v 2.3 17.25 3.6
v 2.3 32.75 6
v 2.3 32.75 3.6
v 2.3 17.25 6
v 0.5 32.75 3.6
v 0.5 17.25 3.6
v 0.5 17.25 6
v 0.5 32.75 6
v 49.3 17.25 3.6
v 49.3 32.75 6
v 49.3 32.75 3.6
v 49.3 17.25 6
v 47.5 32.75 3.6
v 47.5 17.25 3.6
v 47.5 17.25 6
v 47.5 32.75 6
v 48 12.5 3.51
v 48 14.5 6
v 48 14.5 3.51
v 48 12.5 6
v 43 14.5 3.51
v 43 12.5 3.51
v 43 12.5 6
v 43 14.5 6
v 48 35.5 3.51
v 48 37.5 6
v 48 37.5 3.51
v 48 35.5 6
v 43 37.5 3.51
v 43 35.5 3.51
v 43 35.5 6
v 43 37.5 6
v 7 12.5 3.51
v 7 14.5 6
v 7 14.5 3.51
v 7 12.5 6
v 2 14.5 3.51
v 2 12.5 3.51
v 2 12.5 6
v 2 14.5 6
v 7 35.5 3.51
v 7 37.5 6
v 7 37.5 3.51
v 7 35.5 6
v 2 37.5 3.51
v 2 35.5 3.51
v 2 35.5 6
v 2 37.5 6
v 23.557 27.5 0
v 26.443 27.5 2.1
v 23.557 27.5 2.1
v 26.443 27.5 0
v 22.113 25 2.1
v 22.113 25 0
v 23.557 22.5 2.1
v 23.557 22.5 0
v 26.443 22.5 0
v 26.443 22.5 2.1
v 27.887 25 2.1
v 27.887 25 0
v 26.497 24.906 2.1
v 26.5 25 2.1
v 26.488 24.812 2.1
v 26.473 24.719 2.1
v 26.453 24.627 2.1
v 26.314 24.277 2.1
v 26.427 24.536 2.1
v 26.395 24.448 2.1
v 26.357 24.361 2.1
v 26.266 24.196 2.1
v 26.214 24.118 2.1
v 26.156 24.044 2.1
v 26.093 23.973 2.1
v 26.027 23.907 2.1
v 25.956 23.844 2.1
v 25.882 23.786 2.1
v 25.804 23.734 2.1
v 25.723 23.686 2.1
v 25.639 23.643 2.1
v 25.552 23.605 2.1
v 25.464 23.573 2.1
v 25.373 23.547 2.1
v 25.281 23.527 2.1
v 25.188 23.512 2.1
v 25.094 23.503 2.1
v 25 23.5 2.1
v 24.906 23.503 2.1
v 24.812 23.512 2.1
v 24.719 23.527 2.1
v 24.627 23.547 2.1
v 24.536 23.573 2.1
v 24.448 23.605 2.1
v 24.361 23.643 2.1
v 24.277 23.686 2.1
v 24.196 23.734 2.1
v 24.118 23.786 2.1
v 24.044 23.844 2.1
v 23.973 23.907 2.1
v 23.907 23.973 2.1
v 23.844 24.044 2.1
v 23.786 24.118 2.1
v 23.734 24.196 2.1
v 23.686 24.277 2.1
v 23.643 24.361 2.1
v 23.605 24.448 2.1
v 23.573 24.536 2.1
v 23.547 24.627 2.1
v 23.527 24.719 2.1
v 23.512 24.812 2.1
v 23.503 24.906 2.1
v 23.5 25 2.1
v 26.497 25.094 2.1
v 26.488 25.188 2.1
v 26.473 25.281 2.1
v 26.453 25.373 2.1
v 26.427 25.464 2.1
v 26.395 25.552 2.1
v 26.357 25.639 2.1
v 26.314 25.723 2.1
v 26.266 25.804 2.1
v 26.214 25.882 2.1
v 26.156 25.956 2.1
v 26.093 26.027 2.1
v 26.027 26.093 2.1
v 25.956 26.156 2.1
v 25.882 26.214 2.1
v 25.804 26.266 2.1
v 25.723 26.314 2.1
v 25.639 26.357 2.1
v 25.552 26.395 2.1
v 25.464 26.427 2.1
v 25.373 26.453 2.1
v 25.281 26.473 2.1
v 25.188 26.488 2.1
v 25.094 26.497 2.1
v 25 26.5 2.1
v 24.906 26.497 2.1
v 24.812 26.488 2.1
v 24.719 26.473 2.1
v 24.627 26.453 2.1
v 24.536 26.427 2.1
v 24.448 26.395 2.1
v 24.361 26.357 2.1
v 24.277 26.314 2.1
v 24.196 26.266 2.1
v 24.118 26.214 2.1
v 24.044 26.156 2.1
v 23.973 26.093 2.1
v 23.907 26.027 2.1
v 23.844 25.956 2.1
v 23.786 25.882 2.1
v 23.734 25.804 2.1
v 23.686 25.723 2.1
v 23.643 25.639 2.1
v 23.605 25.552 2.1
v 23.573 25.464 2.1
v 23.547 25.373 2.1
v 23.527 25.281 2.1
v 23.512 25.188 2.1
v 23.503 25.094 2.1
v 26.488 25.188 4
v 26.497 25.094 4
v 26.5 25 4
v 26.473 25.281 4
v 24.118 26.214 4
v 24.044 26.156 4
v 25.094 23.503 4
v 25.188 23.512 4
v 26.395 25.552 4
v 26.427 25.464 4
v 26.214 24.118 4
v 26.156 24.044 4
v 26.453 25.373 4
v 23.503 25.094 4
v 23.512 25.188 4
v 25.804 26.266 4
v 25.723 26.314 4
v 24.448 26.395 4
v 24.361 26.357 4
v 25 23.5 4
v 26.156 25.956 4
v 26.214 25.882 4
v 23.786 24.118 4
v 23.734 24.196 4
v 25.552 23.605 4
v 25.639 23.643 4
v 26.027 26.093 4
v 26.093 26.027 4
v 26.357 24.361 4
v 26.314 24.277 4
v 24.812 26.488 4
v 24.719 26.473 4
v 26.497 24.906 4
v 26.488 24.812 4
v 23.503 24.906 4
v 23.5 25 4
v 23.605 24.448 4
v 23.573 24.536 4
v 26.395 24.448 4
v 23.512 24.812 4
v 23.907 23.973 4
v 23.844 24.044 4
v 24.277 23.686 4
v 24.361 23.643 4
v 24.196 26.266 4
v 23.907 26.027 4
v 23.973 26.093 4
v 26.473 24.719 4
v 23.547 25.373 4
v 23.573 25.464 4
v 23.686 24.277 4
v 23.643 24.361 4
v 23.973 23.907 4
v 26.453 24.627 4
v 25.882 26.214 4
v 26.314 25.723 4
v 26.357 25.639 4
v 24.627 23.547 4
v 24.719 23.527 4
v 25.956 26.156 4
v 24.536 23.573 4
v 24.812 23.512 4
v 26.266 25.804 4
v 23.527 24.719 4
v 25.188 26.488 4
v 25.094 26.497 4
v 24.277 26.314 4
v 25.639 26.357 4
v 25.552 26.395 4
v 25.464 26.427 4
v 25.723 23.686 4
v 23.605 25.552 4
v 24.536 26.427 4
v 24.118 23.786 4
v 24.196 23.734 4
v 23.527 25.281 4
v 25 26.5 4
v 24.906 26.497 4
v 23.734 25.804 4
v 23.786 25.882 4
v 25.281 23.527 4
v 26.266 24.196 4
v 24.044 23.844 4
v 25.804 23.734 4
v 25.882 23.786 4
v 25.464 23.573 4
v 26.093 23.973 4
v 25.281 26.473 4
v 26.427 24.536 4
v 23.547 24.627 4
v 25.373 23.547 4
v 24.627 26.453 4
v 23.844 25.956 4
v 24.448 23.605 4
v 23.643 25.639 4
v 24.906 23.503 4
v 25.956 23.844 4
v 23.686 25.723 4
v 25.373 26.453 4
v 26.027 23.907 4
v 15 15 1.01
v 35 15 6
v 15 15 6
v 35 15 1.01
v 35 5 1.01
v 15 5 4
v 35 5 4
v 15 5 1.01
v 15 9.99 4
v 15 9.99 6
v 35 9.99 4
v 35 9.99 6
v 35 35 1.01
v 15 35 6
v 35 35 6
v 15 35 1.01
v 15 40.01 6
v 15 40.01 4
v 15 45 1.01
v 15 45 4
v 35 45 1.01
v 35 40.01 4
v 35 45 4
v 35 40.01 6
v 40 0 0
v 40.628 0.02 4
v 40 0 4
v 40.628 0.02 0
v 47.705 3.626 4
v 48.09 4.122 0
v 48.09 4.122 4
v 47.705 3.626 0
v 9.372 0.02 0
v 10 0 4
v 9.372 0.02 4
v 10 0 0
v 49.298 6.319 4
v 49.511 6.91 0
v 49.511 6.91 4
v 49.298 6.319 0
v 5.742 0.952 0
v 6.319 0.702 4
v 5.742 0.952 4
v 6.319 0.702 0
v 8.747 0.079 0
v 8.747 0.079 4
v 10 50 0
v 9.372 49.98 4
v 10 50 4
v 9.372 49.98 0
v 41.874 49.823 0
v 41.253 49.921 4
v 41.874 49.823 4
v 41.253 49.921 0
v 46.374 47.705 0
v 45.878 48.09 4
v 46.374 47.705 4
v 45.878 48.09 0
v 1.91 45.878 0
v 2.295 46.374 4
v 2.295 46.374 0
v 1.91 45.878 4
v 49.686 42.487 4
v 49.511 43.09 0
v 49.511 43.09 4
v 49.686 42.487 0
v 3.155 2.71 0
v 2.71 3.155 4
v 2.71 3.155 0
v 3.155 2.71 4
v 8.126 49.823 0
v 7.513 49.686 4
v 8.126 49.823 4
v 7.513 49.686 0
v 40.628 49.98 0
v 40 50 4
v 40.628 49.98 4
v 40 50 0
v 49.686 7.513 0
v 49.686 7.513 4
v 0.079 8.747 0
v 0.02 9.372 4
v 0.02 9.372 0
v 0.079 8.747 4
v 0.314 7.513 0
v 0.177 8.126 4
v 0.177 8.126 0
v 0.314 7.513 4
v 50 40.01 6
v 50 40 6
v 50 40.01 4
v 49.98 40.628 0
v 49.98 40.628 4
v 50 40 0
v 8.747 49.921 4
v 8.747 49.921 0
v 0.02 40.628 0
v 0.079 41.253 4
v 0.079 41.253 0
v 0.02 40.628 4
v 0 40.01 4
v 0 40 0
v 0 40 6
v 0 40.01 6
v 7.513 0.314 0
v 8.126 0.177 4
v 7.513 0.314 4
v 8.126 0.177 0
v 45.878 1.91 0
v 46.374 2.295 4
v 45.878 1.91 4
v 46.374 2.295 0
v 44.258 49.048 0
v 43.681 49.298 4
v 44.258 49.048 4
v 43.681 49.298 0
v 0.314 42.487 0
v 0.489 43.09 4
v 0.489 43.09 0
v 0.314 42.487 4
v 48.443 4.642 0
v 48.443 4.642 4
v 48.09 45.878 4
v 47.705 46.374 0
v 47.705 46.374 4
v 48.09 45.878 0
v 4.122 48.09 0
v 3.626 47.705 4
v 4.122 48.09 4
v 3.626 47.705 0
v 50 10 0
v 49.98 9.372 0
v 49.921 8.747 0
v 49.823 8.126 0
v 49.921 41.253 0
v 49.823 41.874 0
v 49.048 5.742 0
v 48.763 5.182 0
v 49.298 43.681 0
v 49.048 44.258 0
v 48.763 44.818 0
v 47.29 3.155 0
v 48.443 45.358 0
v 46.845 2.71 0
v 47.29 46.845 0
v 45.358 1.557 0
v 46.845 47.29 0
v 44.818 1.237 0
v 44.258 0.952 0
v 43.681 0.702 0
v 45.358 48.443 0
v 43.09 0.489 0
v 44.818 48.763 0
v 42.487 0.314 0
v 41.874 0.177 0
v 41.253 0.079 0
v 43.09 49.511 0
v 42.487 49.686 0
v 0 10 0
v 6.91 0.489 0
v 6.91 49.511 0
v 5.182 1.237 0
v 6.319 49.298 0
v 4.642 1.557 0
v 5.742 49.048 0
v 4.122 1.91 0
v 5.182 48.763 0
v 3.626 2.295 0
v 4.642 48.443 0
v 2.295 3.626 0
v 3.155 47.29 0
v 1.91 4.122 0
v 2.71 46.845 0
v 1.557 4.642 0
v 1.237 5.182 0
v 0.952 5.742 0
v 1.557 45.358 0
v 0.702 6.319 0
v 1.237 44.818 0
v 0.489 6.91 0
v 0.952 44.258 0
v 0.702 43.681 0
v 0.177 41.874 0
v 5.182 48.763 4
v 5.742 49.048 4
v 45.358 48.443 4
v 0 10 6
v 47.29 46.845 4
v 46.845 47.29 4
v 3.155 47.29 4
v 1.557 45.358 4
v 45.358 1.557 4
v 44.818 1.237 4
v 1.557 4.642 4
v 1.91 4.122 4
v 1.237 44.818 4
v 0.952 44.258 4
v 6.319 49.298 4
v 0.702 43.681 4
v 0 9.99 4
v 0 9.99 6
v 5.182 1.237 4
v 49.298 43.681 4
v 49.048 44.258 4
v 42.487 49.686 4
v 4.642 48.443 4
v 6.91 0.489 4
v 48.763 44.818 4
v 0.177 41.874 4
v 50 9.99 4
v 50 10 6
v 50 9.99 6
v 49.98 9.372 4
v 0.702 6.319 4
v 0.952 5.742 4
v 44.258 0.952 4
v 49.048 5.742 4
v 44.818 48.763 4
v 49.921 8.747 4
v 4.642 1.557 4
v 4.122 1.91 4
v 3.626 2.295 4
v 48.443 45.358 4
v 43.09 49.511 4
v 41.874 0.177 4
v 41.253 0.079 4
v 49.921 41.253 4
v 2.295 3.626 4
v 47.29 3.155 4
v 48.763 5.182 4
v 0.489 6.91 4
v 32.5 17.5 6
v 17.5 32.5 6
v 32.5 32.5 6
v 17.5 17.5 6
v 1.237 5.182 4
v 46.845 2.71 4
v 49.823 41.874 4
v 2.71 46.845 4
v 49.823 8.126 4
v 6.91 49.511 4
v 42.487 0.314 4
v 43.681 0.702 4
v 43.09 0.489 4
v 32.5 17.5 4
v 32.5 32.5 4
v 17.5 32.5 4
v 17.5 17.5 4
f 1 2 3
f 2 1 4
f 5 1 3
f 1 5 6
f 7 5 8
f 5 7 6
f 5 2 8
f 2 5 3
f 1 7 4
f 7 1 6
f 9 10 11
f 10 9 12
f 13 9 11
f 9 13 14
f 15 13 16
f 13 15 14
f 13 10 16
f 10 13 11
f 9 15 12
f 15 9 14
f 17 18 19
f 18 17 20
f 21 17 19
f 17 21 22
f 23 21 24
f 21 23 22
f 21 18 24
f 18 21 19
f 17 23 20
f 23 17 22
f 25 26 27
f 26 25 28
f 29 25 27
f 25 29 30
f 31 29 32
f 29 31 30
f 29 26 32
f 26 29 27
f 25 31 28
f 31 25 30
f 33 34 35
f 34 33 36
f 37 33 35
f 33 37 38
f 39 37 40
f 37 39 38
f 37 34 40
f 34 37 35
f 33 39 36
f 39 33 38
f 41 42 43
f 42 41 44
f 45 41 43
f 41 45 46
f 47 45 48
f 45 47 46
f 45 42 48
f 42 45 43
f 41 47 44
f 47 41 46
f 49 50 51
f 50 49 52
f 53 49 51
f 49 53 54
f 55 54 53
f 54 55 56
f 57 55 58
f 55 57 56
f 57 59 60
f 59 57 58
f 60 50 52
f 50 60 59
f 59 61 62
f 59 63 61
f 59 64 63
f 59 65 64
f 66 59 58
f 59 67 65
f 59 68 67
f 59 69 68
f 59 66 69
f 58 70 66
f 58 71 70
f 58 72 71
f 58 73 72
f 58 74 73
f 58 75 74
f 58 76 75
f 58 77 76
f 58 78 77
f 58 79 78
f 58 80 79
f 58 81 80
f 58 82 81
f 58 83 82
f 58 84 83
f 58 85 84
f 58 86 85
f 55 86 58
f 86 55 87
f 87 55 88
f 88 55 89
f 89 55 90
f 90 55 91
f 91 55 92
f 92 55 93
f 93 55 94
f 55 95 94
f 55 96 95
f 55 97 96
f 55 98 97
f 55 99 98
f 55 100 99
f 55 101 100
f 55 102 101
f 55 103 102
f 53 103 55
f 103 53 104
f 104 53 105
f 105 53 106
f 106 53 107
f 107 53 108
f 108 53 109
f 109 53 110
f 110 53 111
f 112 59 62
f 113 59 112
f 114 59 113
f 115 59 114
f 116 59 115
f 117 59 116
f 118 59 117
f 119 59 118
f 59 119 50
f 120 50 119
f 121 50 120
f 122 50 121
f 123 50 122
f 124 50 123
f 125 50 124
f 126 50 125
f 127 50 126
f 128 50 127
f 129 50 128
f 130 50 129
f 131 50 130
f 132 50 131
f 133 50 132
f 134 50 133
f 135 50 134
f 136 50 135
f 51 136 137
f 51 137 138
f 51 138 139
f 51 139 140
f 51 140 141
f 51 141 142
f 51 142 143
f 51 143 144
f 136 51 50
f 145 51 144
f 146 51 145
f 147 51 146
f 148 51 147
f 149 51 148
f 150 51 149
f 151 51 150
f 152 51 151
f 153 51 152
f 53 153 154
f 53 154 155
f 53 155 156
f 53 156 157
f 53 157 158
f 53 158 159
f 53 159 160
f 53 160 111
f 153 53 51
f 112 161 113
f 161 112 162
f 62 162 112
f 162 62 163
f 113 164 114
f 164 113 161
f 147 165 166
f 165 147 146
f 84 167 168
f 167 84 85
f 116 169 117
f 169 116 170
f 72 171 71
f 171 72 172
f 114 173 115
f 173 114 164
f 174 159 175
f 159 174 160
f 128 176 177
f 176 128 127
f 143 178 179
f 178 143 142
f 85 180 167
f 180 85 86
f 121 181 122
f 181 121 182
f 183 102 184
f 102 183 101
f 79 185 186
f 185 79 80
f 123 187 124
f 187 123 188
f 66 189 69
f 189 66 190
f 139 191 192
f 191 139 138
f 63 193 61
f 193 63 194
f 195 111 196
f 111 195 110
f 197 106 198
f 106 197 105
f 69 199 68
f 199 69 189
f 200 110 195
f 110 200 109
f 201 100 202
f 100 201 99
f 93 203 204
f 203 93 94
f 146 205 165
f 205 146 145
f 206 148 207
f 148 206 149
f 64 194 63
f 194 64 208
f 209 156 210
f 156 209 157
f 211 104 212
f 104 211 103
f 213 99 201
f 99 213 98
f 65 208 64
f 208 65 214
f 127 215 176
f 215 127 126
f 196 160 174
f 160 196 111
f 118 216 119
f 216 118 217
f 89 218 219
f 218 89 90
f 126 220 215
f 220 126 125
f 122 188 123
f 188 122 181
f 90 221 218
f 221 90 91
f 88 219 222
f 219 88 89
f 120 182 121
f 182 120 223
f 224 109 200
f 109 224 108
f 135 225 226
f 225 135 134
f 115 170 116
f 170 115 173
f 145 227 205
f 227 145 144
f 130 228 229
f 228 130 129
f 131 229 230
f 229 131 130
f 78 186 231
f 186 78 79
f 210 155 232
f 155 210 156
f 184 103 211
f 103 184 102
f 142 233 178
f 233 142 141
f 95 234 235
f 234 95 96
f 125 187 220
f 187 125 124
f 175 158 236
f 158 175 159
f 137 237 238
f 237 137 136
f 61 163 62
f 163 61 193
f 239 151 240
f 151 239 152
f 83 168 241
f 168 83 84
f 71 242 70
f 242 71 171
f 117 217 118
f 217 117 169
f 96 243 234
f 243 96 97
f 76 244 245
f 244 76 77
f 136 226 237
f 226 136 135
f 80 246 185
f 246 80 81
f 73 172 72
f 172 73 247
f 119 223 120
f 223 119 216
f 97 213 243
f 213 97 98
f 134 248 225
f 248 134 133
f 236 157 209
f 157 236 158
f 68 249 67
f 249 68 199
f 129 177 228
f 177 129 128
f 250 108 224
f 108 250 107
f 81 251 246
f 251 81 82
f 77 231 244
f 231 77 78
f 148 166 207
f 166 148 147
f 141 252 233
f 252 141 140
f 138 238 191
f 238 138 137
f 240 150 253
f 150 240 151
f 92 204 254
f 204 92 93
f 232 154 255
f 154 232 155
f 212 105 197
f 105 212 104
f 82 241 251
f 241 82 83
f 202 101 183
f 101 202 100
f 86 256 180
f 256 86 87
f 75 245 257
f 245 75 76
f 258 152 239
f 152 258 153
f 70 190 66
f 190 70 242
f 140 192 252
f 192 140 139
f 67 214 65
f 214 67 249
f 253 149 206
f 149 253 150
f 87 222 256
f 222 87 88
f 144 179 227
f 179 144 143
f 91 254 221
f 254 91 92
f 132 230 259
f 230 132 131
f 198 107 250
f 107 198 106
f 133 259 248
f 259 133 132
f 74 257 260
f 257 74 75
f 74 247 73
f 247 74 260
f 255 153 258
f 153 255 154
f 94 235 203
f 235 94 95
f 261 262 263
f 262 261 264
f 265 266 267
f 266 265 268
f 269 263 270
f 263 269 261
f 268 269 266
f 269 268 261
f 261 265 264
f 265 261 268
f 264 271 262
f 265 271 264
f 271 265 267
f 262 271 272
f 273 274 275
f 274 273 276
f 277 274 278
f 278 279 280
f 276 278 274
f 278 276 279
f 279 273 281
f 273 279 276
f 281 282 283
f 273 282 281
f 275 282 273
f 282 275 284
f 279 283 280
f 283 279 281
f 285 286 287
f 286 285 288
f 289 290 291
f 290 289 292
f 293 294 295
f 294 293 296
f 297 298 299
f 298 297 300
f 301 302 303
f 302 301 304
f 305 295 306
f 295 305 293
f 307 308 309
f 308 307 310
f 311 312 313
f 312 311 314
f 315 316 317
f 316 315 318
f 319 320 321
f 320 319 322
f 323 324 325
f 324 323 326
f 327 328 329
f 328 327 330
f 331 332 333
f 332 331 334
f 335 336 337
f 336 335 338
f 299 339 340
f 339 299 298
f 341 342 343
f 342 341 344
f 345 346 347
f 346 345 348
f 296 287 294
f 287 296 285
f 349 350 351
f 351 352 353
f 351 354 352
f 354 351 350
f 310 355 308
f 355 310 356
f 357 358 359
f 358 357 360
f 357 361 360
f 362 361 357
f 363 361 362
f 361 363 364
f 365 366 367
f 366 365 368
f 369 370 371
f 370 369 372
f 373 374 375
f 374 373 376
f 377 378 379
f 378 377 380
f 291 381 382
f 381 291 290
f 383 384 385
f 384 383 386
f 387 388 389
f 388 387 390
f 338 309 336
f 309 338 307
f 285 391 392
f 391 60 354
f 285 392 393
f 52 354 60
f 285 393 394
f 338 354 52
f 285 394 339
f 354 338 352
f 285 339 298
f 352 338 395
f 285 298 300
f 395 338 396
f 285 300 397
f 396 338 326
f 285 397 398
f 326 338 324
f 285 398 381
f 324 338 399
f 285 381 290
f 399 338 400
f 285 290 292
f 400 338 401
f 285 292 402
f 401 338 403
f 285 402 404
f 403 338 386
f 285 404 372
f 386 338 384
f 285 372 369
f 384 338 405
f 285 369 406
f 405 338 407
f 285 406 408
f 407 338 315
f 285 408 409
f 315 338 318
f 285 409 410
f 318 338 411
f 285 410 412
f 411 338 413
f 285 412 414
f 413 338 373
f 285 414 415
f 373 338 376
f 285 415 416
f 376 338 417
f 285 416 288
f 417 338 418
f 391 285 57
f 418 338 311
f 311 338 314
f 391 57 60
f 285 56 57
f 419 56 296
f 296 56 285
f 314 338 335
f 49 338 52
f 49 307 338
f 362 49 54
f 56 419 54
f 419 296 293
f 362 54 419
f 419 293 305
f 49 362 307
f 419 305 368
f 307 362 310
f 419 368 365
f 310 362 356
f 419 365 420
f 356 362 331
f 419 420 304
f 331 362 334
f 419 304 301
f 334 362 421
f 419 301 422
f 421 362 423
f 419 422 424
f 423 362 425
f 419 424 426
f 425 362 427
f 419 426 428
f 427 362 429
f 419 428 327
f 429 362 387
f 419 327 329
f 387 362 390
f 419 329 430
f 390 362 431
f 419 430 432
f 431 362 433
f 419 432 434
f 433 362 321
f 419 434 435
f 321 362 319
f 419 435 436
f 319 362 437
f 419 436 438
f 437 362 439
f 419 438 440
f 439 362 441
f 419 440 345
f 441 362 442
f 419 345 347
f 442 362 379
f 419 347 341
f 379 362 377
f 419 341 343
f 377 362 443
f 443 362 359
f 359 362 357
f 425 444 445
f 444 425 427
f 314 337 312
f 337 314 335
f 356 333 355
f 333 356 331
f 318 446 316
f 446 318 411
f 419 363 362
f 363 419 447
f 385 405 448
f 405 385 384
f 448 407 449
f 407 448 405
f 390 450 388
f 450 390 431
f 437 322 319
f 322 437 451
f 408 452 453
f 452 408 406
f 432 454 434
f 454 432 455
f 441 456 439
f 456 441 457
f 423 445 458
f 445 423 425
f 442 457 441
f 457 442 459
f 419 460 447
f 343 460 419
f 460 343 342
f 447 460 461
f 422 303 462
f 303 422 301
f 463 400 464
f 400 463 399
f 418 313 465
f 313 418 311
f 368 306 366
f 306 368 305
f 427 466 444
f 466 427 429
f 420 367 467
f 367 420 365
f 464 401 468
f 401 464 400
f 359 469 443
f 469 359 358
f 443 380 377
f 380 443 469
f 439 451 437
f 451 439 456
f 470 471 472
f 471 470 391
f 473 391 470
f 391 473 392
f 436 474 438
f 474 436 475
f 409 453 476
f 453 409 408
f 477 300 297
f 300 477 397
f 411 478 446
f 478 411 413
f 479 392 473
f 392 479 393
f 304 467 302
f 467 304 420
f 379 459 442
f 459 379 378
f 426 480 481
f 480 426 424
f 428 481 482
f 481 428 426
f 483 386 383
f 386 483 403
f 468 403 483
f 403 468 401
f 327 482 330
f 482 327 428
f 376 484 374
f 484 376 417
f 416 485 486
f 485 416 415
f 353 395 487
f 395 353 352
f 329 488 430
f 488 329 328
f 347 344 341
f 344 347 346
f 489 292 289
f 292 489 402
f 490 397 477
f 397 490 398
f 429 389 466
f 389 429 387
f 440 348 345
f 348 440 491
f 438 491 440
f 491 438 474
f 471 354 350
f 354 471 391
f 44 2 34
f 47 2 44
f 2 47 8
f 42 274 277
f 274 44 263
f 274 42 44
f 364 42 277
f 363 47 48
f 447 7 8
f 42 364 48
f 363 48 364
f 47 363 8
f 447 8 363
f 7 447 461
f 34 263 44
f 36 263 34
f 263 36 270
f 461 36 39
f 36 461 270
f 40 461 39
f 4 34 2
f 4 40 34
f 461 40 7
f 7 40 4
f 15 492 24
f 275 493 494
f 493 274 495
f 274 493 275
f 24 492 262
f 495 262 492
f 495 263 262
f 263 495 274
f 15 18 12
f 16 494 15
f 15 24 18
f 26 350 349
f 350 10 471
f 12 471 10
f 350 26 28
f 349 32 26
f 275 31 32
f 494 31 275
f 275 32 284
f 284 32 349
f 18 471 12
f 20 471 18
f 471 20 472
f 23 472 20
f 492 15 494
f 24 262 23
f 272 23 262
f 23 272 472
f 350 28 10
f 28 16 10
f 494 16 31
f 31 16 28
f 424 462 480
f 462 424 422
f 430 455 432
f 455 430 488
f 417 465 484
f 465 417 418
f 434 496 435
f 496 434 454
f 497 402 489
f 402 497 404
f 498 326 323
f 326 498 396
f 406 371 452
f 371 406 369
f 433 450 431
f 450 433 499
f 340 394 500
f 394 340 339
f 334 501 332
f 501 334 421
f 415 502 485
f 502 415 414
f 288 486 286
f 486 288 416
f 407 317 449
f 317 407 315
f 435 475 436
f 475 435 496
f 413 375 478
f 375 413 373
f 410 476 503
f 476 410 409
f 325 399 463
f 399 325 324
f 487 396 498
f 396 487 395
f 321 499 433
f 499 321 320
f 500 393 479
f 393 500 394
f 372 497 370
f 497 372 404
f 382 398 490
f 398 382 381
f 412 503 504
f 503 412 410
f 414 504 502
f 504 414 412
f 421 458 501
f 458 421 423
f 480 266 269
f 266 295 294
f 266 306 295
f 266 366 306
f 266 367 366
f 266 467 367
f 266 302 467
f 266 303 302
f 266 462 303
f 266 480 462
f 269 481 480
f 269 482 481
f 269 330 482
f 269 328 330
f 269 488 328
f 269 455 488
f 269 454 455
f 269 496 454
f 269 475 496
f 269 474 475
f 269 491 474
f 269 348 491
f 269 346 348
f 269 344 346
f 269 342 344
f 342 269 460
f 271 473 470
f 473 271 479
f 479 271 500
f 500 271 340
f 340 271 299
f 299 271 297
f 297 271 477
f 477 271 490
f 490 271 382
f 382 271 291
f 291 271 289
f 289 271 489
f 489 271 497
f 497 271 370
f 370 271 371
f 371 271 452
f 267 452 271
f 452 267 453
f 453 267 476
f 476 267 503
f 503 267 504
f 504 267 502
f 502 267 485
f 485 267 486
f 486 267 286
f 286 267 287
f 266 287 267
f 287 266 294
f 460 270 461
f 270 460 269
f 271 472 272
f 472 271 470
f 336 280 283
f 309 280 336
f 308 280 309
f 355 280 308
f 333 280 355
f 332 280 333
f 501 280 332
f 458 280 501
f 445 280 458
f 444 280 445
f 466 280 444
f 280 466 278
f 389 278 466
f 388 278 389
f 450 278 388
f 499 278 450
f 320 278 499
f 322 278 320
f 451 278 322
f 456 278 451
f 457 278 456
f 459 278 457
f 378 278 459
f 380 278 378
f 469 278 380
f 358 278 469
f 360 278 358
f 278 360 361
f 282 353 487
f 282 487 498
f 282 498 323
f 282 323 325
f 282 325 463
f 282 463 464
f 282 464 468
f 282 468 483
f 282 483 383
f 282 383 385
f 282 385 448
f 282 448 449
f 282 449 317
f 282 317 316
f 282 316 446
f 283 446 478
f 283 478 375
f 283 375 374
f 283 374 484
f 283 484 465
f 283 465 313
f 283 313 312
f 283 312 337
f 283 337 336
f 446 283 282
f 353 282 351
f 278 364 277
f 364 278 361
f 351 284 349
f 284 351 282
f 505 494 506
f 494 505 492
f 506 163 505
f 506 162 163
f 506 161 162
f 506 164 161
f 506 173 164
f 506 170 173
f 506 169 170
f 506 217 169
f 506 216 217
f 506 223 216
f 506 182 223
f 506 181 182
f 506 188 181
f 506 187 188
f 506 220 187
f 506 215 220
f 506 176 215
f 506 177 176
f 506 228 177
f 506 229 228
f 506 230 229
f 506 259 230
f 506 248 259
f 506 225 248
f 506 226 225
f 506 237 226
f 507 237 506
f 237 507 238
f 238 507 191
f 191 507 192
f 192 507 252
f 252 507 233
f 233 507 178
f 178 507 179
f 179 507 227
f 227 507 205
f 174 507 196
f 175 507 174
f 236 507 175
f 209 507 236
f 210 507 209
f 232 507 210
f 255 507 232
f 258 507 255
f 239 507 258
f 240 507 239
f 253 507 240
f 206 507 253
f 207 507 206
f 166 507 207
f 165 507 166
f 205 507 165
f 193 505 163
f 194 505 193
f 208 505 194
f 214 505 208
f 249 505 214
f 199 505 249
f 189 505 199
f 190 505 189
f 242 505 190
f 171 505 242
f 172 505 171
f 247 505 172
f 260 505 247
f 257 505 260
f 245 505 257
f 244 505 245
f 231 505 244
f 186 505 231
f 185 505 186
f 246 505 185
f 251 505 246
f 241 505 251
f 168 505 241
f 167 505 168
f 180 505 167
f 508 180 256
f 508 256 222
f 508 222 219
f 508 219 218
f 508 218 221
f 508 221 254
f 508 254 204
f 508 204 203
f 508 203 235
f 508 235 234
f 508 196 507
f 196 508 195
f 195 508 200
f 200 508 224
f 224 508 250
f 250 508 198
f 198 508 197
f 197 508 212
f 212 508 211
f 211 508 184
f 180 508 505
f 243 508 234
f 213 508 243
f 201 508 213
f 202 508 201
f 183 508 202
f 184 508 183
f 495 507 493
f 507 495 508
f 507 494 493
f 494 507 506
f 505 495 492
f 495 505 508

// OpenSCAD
// file: parts.scad
Mtolerance = 0.1;
M5size = 7.8;
M2_5size = 4.9;

function M5() = M5size + Mtolerance;

function M2_5() = M2_5size + Mtolerance;

module hexHole(flatToFlatDistance, depth) {
    previewOptimize = 0.1;
    hexagonSide = flatToFlatDistance / (cos(30) * 2);

    translate([0, 0, -previewOptimize]) {
        linear_extrude(height=depth + previewOptimize * 2, center=false) {
            polygon(points=[
                    [hexagonSide, 0],
                    [hexagonSide / 2, sqrt(3) * hexagonSide / 2],
                    [-hexagonSide / 2, sqrt(3) * hexagonSide / 2],
                    [-hexagonSide, 0],
                    [-hexagonSide / 2, -sqrt(3) * hexagonSide / 2],
                    [hexagonSide / 2, -sqrt(3) * hexagonSide / 2]
                ]);
        }
    }
}

// Rounded rectangle module
module rounded_rectangle(width, height, r, fn=64) {
    // ensure radius doesn't exceed half of width/height
    rr = min(r, width/2, height/2);

    translate([rr, rr])
        offset(r=rr, $fn=fn)
            square([width - 2*rr, height - 2*rr]);

}
// main file
use <./parts.scad>

difference() {
    linear_extrude(height=6)
        rounded_rectangle(50, 50, 10, fn=100);

    translate([.5,0,0])
    translate([0,50/2-15.5/2,0.1])
    translate([0,0,3.5]) {
        cube([1.8, 15.5, 2.5], center=false);

        translate([47,0,0])
            cube([1.8, 15.5, 2.5], center=false);
    }


    translate([2,12.5,0])
        translate([0,0,3.51]) {
            {
                cube([5, 2,2.5], center=false);

                translate([0, 23, 0])
                    cube([5, 2, 2.5], center=false);
            }

            translate([41,0,0])
                {
                    cube([5, 2,2.5], center=false);

                    translate([0, 23, 0])
                        cube([5, 2, 2.5], center=false);
                }
        }

    translate([0,-0.01,4])
        cube([50, 10, 5], center=false);

    translate([0,40.01,4])
        cube([50, 10, 5], center=false);

    {
        translate([25,25,-.5]) {
            hexHole(flatToFlatDistance = M2_5(), depth=2.5);
            cylinder(d=3, h=50, center=false, $fn=100);
        }
    }

    translate([25,25,7.5 - 1])
        cube([15, 15, 5], center=true);


    translate([25, 10, 3.51]) {
        rotate([0,0,90])
            cube([10, 20, 5], center=true);

        translate([0,30,0])
            rotate([0,0,90])
                cube([10, 20, 5], center=true);
    }
}




//    translate([0,frame_width-frame_part_width,0])
//        translate([(frame_width-23)/2 - cutout_size/2, 0, frame_height - 1 + .01]) {
//            translate([0, 0, 0])
//                cube([cutout_size, frame_part_width, 1], center=false);
//
//            translate([23, 0, 0])
//                cube([cutout_size, frame_part_width, 1], center=false);
//        }
